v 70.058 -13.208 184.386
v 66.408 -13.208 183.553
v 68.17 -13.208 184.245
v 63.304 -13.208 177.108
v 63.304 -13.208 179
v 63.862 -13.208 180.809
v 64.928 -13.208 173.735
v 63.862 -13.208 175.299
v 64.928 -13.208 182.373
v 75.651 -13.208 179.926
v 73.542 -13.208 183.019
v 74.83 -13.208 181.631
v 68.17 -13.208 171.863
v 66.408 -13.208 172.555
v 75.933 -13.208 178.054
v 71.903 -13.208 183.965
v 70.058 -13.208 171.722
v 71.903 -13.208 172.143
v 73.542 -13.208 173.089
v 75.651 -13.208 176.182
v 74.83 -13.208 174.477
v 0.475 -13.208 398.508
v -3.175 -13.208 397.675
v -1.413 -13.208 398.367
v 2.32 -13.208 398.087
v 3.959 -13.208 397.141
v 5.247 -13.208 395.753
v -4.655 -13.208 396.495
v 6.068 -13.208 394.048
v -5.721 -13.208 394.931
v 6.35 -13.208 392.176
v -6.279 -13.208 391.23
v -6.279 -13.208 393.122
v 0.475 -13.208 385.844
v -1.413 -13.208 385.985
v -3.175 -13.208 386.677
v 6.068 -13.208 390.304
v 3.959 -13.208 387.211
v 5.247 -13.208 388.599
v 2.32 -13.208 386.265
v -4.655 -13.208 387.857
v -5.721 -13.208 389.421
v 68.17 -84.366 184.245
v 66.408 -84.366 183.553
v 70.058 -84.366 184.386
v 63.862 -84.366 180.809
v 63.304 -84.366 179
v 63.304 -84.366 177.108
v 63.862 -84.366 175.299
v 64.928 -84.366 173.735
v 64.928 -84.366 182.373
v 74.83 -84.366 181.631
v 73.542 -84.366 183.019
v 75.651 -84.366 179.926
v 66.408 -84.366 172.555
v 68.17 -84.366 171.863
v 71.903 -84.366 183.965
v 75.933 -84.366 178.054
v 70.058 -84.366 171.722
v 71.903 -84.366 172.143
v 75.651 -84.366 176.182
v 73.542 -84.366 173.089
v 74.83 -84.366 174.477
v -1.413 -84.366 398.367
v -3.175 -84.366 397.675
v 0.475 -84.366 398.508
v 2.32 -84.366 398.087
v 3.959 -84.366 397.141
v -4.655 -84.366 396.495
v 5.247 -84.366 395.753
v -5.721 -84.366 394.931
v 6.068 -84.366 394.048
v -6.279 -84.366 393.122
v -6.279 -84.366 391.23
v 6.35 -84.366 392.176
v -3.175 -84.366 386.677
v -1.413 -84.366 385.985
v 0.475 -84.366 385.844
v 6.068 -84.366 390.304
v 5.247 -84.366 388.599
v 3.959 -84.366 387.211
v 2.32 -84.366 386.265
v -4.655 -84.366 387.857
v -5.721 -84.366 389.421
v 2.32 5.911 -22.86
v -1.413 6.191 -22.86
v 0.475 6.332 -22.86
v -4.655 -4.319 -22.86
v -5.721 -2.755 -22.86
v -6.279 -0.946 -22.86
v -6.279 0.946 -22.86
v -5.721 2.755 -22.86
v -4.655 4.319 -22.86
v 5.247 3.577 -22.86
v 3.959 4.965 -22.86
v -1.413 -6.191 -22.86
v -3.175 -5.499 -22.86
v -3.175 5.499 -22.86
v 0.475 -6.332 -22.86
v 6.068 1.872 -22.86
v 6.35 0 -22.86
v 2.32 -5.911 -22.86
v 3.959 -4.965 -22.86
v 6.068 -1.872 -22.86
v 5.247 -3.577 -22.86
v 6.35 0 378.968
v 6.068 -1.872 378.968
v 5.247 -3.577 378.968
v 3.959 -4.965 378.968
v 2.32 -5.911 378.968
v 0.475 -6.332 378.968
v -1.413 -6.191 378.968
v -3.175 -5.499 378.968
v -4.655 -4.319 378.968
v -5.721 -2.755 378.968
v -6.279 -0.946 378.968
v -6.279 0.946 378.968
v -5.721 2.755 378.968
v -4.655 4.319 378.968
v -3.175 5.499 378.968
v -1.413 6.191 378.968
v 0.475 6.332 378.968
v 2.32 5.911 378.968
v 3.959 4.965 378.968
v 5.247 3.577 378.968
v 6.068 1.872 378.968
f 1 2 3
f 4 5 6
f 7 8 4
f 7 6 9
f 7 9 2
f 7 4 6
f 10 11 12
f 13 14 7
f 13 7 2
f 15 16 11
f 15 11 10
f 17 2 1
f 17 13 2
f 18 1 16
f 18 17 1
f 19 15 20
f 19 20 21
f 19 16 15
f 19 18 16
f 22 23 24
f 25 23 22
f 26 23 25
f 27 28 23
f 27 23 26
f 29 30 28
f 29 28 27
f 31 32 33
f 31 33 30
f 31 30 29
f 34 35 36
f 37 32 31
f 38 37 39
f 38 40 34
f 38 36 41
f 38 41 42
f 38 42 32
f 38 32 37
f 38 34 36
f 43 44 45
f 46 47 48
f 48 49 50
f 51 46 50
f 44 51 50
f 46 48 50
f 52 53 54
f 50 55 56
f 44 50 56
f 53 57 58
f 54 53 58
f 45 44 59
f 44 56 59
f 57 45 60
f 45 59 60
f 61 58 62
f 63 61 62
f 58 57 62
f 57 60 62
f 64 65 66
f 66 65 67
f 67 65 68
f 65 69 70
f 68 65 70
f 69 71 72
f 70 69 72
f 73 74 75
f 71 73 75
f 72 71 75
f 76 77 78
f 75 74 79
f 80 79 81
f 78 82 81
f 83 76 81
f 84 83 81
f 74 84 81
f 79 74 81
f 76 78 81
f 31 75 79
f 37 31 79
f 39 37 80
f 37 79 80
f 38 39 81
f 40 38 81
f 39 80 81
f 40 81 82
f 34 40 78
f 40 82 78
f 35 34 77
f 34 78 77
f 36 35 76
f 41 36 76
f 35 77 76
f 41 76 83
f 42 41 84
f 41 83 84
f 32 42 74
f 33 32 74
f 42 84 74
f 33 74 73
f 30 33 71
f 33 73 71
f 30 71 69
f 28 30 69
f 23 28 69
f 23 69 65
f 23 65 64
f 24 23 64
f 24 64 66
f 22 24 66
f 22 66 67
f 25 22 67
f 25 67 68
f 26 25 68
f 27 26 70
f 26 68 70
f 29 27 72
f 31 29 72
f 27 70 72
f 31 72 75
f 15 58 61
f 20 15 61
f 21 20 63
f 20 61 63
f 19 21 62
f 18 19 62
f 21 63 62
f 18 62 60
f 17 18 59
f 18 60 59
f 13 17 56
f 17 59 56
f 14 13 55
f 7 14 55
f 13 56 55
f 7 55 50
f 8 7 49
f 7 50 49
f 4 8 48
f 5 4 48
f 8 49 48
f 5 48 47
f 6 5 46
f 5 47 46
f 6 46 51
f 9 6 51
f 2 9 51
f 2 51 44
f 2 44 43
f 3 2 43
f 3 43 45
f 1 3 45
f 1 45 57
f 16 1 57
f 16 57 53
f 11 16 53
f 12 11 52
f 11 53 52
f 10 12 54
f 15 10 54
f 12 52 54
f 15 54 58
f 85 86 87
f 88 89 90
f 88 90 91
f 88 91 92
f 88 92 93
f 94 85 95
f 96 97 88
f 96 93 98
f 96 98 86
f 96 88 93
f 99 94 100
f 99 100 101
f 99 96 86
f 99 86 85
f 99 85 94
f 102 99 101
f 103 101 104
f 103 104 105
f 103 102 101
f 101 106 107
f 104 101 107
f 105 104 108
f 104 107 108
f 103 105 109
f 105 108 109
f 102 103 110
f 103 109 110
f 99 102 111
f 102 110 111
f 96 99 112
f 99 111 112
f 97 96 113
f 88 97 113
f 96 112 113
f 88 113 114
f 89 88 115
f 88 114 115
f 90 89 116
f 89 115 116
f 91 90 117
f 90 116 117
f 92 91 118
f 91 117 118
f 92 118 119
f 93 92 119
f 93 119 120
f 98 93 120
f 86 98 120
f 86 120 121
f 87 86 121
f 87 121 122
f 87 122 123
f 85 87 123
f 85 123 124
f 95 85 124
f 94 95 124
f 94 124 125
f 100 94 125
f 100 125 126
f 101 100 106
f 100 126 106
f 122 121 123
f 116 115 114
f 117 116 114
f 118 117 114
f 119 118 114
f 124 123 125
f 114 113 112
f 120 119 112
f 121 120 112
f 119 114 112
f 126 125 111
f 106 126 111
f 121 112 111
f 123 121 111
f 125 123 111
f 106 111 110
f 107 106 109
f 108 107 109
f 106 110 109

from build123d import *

# Parameters (mm, degrees)
BOSS_EXTRUDE1_OUTLINE_R = 6.35
BOSS_EXTRUDE1_DEPTH     = 71.1581
SKETCH3_R               = 6.35
BOSS_EXTRUDE2_DEPTH     = 401.828


# Read off the part's stored shape, not the designer's step: Boss-Extrude1
with BuildPart() as part:
    # Boss-Extrude1 outline → Boss-Extrude1 (new body)
    with BuildSketch(Plane(origin=(0, -84.3661, 0), x_dir=(1, 0, 0), z_dir=(0, 1, 0))):
        with Locations((0, -392.176)):
            Circle(BOSS_EXTRUDE1_OUTLINE_R)
        with Locations((69.5833, -178.054)):
            Circle(BOSS_EXTRUDE1_OUTLINE_R)
    extrude(amount=BOSS_EXTRUDE1_DEPTH)


with BuildPart() as body_2:
    # Sketch3 → Boss-Extrude2 (new body)
    with BuildSketch(Plane(origin=(0, 0, 378.968), x_dir=(-1, 0, 0), z_dir=(0, 0, -1))):
        with Locations(Location((0, 0, 0), (0, 0, 180))):
            Circle(SKETCH3_R)
    extrude(amount=BOSS_EXTRUDE2_DEPTH)


solid = Compound([part.part, body_2.part])
